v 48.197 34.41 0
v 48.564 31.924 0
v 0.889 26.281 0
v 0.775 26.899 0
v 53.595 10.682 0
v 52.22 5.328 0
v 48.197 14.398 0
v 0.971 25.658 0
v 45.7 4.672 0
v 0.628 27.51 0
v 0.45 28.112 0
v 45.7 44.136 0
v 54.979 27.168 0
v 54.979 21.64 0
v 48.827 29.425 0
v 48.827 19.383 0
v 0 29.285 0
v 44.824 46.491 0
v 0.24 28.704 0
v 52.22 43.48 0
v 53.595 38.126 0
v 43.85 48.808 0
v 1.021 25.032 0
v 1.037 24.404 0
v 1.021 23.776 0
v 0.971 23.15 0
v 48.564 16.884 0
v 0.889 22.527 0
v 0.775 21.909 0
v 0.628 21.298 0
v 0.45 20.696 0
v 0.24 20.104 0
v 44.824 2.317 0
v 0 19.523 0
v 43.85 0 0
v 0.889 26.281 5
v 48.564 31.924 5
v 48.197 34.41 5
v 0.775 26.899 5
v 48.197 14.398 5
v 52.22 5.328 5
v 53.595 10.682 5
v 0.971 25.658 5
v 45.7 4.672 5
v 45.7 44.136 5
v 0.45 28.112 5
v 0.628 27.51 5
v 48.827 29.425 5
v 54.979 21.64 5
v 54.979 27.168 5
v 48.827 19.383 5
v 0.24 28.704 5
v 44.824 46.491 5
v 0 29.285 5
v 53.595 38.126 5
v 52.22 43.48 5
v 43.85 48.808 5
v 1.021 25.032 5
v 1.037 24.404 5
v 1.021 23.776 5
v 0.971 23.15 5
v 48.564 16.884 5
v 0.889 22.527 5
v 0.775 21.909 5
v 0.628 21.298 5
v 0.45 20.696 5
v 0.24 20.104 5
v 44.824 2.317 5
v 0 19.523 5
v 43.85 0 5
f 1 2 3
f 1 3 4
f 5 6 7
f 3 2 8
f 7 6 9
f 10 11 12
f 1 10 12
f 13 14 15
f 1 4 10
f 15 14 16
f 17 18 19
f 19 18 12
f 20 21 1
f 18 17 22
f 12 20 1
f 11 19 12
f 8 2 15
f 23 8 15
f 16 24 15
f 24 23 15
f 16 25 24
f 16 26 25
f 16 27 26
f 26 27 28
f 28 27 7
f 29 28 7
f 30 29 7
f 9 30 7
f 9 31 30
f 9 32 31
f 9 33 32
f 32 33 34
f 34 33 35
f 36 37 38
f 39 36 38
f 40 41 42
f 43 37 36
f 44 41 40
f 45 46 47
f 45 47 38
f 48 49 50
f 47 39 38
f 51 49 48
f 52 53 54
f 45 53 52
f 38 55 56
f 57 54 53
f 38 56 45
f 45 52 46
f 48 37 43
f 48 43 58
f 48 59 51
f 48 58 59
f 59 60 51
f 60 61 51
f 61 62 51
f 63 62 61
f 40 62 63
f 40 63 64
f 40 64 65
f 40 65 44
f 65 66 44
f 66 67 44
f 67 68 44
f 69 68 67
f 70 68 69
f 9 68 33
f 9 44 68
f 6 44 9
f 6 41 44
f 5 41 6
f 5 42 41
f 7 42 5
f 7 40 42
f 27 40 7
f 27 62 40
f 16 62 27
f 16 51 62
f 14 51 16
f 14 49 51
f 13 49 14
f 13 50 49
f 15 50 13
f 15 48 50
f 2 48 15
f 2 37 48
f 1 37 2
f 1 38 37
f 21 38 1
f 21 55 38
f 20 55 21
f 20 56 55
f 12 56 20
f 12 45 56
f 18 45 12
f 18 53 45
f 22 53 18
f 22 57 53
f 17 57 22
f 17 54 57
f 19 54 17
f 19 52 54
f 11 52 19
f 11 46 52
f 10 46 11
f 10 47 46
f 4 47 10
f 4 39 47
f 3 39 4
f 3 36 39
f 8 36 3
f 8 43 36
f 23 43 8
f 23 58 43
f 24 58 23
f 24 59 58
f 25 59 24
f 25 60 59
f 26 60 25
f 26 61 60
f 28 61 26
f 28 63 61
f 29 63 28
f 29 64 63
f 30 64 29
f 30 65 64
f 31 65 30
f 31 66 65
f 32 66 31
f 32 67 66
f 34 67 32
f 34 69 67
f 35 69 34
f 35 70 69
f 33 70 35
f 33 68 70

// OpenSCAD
$fn = 32;

// ----------------------------------------------------------------------
// Gear sector: 3 teeth on 48 degrees
// ----------------------------------------------------------------------

// --- parameters (mm) ---
sector_angle = 48;        // sector angle, degrees
root_r = 60;              // root circle radius
tooth_h = 6;              // tooth height over the root circle
teeth = 3;                // number of teeth on the sector
hub_r = 12;               // hub bore radius
plate_t = 5;              // sector thickness, Z
arc_step = 3;             // sampling step of the root/hub arcs, degrees

tip_r = root_r + tooth_h;  // tip circle radius

profile = [[43.85, 0], [44.824, 2.317], [45.7, 4.672], [52.22, 5.328], [53.595, 10.682], [48.197, 14.398], [48.564, 16.884], [48.827, 19.383], [54.979, 21.64], [54.979, 27.168], [48.827, 29.425], [48.564, 31.924], [48.197, 34.41], [53.595, 38.126], [52.22, 43.48], [45.7, 44.136], [44.824, 46.491], [43.85, 48.808], [0, 29.285], [0.24, 28.704], [0.45, 28.112], [0.628, 27.51], [0.775, 26.899], [0.889, 26.281], [0.971, 25.658], [1.021, 25.032], [1.037, 24.404], [1.021, 23.776], [0.971, 23.15], [0.889, 22.527], [0.775, 21.909], [0.628, 21.298], [0.45, 20.696], [0.24, 20.104], [0, 19.523]];  // primary outline, 35 points, counter clockwise

// --- the one profile operation ---
linear_extrude(height = plate_t) polygon(points = profile);
